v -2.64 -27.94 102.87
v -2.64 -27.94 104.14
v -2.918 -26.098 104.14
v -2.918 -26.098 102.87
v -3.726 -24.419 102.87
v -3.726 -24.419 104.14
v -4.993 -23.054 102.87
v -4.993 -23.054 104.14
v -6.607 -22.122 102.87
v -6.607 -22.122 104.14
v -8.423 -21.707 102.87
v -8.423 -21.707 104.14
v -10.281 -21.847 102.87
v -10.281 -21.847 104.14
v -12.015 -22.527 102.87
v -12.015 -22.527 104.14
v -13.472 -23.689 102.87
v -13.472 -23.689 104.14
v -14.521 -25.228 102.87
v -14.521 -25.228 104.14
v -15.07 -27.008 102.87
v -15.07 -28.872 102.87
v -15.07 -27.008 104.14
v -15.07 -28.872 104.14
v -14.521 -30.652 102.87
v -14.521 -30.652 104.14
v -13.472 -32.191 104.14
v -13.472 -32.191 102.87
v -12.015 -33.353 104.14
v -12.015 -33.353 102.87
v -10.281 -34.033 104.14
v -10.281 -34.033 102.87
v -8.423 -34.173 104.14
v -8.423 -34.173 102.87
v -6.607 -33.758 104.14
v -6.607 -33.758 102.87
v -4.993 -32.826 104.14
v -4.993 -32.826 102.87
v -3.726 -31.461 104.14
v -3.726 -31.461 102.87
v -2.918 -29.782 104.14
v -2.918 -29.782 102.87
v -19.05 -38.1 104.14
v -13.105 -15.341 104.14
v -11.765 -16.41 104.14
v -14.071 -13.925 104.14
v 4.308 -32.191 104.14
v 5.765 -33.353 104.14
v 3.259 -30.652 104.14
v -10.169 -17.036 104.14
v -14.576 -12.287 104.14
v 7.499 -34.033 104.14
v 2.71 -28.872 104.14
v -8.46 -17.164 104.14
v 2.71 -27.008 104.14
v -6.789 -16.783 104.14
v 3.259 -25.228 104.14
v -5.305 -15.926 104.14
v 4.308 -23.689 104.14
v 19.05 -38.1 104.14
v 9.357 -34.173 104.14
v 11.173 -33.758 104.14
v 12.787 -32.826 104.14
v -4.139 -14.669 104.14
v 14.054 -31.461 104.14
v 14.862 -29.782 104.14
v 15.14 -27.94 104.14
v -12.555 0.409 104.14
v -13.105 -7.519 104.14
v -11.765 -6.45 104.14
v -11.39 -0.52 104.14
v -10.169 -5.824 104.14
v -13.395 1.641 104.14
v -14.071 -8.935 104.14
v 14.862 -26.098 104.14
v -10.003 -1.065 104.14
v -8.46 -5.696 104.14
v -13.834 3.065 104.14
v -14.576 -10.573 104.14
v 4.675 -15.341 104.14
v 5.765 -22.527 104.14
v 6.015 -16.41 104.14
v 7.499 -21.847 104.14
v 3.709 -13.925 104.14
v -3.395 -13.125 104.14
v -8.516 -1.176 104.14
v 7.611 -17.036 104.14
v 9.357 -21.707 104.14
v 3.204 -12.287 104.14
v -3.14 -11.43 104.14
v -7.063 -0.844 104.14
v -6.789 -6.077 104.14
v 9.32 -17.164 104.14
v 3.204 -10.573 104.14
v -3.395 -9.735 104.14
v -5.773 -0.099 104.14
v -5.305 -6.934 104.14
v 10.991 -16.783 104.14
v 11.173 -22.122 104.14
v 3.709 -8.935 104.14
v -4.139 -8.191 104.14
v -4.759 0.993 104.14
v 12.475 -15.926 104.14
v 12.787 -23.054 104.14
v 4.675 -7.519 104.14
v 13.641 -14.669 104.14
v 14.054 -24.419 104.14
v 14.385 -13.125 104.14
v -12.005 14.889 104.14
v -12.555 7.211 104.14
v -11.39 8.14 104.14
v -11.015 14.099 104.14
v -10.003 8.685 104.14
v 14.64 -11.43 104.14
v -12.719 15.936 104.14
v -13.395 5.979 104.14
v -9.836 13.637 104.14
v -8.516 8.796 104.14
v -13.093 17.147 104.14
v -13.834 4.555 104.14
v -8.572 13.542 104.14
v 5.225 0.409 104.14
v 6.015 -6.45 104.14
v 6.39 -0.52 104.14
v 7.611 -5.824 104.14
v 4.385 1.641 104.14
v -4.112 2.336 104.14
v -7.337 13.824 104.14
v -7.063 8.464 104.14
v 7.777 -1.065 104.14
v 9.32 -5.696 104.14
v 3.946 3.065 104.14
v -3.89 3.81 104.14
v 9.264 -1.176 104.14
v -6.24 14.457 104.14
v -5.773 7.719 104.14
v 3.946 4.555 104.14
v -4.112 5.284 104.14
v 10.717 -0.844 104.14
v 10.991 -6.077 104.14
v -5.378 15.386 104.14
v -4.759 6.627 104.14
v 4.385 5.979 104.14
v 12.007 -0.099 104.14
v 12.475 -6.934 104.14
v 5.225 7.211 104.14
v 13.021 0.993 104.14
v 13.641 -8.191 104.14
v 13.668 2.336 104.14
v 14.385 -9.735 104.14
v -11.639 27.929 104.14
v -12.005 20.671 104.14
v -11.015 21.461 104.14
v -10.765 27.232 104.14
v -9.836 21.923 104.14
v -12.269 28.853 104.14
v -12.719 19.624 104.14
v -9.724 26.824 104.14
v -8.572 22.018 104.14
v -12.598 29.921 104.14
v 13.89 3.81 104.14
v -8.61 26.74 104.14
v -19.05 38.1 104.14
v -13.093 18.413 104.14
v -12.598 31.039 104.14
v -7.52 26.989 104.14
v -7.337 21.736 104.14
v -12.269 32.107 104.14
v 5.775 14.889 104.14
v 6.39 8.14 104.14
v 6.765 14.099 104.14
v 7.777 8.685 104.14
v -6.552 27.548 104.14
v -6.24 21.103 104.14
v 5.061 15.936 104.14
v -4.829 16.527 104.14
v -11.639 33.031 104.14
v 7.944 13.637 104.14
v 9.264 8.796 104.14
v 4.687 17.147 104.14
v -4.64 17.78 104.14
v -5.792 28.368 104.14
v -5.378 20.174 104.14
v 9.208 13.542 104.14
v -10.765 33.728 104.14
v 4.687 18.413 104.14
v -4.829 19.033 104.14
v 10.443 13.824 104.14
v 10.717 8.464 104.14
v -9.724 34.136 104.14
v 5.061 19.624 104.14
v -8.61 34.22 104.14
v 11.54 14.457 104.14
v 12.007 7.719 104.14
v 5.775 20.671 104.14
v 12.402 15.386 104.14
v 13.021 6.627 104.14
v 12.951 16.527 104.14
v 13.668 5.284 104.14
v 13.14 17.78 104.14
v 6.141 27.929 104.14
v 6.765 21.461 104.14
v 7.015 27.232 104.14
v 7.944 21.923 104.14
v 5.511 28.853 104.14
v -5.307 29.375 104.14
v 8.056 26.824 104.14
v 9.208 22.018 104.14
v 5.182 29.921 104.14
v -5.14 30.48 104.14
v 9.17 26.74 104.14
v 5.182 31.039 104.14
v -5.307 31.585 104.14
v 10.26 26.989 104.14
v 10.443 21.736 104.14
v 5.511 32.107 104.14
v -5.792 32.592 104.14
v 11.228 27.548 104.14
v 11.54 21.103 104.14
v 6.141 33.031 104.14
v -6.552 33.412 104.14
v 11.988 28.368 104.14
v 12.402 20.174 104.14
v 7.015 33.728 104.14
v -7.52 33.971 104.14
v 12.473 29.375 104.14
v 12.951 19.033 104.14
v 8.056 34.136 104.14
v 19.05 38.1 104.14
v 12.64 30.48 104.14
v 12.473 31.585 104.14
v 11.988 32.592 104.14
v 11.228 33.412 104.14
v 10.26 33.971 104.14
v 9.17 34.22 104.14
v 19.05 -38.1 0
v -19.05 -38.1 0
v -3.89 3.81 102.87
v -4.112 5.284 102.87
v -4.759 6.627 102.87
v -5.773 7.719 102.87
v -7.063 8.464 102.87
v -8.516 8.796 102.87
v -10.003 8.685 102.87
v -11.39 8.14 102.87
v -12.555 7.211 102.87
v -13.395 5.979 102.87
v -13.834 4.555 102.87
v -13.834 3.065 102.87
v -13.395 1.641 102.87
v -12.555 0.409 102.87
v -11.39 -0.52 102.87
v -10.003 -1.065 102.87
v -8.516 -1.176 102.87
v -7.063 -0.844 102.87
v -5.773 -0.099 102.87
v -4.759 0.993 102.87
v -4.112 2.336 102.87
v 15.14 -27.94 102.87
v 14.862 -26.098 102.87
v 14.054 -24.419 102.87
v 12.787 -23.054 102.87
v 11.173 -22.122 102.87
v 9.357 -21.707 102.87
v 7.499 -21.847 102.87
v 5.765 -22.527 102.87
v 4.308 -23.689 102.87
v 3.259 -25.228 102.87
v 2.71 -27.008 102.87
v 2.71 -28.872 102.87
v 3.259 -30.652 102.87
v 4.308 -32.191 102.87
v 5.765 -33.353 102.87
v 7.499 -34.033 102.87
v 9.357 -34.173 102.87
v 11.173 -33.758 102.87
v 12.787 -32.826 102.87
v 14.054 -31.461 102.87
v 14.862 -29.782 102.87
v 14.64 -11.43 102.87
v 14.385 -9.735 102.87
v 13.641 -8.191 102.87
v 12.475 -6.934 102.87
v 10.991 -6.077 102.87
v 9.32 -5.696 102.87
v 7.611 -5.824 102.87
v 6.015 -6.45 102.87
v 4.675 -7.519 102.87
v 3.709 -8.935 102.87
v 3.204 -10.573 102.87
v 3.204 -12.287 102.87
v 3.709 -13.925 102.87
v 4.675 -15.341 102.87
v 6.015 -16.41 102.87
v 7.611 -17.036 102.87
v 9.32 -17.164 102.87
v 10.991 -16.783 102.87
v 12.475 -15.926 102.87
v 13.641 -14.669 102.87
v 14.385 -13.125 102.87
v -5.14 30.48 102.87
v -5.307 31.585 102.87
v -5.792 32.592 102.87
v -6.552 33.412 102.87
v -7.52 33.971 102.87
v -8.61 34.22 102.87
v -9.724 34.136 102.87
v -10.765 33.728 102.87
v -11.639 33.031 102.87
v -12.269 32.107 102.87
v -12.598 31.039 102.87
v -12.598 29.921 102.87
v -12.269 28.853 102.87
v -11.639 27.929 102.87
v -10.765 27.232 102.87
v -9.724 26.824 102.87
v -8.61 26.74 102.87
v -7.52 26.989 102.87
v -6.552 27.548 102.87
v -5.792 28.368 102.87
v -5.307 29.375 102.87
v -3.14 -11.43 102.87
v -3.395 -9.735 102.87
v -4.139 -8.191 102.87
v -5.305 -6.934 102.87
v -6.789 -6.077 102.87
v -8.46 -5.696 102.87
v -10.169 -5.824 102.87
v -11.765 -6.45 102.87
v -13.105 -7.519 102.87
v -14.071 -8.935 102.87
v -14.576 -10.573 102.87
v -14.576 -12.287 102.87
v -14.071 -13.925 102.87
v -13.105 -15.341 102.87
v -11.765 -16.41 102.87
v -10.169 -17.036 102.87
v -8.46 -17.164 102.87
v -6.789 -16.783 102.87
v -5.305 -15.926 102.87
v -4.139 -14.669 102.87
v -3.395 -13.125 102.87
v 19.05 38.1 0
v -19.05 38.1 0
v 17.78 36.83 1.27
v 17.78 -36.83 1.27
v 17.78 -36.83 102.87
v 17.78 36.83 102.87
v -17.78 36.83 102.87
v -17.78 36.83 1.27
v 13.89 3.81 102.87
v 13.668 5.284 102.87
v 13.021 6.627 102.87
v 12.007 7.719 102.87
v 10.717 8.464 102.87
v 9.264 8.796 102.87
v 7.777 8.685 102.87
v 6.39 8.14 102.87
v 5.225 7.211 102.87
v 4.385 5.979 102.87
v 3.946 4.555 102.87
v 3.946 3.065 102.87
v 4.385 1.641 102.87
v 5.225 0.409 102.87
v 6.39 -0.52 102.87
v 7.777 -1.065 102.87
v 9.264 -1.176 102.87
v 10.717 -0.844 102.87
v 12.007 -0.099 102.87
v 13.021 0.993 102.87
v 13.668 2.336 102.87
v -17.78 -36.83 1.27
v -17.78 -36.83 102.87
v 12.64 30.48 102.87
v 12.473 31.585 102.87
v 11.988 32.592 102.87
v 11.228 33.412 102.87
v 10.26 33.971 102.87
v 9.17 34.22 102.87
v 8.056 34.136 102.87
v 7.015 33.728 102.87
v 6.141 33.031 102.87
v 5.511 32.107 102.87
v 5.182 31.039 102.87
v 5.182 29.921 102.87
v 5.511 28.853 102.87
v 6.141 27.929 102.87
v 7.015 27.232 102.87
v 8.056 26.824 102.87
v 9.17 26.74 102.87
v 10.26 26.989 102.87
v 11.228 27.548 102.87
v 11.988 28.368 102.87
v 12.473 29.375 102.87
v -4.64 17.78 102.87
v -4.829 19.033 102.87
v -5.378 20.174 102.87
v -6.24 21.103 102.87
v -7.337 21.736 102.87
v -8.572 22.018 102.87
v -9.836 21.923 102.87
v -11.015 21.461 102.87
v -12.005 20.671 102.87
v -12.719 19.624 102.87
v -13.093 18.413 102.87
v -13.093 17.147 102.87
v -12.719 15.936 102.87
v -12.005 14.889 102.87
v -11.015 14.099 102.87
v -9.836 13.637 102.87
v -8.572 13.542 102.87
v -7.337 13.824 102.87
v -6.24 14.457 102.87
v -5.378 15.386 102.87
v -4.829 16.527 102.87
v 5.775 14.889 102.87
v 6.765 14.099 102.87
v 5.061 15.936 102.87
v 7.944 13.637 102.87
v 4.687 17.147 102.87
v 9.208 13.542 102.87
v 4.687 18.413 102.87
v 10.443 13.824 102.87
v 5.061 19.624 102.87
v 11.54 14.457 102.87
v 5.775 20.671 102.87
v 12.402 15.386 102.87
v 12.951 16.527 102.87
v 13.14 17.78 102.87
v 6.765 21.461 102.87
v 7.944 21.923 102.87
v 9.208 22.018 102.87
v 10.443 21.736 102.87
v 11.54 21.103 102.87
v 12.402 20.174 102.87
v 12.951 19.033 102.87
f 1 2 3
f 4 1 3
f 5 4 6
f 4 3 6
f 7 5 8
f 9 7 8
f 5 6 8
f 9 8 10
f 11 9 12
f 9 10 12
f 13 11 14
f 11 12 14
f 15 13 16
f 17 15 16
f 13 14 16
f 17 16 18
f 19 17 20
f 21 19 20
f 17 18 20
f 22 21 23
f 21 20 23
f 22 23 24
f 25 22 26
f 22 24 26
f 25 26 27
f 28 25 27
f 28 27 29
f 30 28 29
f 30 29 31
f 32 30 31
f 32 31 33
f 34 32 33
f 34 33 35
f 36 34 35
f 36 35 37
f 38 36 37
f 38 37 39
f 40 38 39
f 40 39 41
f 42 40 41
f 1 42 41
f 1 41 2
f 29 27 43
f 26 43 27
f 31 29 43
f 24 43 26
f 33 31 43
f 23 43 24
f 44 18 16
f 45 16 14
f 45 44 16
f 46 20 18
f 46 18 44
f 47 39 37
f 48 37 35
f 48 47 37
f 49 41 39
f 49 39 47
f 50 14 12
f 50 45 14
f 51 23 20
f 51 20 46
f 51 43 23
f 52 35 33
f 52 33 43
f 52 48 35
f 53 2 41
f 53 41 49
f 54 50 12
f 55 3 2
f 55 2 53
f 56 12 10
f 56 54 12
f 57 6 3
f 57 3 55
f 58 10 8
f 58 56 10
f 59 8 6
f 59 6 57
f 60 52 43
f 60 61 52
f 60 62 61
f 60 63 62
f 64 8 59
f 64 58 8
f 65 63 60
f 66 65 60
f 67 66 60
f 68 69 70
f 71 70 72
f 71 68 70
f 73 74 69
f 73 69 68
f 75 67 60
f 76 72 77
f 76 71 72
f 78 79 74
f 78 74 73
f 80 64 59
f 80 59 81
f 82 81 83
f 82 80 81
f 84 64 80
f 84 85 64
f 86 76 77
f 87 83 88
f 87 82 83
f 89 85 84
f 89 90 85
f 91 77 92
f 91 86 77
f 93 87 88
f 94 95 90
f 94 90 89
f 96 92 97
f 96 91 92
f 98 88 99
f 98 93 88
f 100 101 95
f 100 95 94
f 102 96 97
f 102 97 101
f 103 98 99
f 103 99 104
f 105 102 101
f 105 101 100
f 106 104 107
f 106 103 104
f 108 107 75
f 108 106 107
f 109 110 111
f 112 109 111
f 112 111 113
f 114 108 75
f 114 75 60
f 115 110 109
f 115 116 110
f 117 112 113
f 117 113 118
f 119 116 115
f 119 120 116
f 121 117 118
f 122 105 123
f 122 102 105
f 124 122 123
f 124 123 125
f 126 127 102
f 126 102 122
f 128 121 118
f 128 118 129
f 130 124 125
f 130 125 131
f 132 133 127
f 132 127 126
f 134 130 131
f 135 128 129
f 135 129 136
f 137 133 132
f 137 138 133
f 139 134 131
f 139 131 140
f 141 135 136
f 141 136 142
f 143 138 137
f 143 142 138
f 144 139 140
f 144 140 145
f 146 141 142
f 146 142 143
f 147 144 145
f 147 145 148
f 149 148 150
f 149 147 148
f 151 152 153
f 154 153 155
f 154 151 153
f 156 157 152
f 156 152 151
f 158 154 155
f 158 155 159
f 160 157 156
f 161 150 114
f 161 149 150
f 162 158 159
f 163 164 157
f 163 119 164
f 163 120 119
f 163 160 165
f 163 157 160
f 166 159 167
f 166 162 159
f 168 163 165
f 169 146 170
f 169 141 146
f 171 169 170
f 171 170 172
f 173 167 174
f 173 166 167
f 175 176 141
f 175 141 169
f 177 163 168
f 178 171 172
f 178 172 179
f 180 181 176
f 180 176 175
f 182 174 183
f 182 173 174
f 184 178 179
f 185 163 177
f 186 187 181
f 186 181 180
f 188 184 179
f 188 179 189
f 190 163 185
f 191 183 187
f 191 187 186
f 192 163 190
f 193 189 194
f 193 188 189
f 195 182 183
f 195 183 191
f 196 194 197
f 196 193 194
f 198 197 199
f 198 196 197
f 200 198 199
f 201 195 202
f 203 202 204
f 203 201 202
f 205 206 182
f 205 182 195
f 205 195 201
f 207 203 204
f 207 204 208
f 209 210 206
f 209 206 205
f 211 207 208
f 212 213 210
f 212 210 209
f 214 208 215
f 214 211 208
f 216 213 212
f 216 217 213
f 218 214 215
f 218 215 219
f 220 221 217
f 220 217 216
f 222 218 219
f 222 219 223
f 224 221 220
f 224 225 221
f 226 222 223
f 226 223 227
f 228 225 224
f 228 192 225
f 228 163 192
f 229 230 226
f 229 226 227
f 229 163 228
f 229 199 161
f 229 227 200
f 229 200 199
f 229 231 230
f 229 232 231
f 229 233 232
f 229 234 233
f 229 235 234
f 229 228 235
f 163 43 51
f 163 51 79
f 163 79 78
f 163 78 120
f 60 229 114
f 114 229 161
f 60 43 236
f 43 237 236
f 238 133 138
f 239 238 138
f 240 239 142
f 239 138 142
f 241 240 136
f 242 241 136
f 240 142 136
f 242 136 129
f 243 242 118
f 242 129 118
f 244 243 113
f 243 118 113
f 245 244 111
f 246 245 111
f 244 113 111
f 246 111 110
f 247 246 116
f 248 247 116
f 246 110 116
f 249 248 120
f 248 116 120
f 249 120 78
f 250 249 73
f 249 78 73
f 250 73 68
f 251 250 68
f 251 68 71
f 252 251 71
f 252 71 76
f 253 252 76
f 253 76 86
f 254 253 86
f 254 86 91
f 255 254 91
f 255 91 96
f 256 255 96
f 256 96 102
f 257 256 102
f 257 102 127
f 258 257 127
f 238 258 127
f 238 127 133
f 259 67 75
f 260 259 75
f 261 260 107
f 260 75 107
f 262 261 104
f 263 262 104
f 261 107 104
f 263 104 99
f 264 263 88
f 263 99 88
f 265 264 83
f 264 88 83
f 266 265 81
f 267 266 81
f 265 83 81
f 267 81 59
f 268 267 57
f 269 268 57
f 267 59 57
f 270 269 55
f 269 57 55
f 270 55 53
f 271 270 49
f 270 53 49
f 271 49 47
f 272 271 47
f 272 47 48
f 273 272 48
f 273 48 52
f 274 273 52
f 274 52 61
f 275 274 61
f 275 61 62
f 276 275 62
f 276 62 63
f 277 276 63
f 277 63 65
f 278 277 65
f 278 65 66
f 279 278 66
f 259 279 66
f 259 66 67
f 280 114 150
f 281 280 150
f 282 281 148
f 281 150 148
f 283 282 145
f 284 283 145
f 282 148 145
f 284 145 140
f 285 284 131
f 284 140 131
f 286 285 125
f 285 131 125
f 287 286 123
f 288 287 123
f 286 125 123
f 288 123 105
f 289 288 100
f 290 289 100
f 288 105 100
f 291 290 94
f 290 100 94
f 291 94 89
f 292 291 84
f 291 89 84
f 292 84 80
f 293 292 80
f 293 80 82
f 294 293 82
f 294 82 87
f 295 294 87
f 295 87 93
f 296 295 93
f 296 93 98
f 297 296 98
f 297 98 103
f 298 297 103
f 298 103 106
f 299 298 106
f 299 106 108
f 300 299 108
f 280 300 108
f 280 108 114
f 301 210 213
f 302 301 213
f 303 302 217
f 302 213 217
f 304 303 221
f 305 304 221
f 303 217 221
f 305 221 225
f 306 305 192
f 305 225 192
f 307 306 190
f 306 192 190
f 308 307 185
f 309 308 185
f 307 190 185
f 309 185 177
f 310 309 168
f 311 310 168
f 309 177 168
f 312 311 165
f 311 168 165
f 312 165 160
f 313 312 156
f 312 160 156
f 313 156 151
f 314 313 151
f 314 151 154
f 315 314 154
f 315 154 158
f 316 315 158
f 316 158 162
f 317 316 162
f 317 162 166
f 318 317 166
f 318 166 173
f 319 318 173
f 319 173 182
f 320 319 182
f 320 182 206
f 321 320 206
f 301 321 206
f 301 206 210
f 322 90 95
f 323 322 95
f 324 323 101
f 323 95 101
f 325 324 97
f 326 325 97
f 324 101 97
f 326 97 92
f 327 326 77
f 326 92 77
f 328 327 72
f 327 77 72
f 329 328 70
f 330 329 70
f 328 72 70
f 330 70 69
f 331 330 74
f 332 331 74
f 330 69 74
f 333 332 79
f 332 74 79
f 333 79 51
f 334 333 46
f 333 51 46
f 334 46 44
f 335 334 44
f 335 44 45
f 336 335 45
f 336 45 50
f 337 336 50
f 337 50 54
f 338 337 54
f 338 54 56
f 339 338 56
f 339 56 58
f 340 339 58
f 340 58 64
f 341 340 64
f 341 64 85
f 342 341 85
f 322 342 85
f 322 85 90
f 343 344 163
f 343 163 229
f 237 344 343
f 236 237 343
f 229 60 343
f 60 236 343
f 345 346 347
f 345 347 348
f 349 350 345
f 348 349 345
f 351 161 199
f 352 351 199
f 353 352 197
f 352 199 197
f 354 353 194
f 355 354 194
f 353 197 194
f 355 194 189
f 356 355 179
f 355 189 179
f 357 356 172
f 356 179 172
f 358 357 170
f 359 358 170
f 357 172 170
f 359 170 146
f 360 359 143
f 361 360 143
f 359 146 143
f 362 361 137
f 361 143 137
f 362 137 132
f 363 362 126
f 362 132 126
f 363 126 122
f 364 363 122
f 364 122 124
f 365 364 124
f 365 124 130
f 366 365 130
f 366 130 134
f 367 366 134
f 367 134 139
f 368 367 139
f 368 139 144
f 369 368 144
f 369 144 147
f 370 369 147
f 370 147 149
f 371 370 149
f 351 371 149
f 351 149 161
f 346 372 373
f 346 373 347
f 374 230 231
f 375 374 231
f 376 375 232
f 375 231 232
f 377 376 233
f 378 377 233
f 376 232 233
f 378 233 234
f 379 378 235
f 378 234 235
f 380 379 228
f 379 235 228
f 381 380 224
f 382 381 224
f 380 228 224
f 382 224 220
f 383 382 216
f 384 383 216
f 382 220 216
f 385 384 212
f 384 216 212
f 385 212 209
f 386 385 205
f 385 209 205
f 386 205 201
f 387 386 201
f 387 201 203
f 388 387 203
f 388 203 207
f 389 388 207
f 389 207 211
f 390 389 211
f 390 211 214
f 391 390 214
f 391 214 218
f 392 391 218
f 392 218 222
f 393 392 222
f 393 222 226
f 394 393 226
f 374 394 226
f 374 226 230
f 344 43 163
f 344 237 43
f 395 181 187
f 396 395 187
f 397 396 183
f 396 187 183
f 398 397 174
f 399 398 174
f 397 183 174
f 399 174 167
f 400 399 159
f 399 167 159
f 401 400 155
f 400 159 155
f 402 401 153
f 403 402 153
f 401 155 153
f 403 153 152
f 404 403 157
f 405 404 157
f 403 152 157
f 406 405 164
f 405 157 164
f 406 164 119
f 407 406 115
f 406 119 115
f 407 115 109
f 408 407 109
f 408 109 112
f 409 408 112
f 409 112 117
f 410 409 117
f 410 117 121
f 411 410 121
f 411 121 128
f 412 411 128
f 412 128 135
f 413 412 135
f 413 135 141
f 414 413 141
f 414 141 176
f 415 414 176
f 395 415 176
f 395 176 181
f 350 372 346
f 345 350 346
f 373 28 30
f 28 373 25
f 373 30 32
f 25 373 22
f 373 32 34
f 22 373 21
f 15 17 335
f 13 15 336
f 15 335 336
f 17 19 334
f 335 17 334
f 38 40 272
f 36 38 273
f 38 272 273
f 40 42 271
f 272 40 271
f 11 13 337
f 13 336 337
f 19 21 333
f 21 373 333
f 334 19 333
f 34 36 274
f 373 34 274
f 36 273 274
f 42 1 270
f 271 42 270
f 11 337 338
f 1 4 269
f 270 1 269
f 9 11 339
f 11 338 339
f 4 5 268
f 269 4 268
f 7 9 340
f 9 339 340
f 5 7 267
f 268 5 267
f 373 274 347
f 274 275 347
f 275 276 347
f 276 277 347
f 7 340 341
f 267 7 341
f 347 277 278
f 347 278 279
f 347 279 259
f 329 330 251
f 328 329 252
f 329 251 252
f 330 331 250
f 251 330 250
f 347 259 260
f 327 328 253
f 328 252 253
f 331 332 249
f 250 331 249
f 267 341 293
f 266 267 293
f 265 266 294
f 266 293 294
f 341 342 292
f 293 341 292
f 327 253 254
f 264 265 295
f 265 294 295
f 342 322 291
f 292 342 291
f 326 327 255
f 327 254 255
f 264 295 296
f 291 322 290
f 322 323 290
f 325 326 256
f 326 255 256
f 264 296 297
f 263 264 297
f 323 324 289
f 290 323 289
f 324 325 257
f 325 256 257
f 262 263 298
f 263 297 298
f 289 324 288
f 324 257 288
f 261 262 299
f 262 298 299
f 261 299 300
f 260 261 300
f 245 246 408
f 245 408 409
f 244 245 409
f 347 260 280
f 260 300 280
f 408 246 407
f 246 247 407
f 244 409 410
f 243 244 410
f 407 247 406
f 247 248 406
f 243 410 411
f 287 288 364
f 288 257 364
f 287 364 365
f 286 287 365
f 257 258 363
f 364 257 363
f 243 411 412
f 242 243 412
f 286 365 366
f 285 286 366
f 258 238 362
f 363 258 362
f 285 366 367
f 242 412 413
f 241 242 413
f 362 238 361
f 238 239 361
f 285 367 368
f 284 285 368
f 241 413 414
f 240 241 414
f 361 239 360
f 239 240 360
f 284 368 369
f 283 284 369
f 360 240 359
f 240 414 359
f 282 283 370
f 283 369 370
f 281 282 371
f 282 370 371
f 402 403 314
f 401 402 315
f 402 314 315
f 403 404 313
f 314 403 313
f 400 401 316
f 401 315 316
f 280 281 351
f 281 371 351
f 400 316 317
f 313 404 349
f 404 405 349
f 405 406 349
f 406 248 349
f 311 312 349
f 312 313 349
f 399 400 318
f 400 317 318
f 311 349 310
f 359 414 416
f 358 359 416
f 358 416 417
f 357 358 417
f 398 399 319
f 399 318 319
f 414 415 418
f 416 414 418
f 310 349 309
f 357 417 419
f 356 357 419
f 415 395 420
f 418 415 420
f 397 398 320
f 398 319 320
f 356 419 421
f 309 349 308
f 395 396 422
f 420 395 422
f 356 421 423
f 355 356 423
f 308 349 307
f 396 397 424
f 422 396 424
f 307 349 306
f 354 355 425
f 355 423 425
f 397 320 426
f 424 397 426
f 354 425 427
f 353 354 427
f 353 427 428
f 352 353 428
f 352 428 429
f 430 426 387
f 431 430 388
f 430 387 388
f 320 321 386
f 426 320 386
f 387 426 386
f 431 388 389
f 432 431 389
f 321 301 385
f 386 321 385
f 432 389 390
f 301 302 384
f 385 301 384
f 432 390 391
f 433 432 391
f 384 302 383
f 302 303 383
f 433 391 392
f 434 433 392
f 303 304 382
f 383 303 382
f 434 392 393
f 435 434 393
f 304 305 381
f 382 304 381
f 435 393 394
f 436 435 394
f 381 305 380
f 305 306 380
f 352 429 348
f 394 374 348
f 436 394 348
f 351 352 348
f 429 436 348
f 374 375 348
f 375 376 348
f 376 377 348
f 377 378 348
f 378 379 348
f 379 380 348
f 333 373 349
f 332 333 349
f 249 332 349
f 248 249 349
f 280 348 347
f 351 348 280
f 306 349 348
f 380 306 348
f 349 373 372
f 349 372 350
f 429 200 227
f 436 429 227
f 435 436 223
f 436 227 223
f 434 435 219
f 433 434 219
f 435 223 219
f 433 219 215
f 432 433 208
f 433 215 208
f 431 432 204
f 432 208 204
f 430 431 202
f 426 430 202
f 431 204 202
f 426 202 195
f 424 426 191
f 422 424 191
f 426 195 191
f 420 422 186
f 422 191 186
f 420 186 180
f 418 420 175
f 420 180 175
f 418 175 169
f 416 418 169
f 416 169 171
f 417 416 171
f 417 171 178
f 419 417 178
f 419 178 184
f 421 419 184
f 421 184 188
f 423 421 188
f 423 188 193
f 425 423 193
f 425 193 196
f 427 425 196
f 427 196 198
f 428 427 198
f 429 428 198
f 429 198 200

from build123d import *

# Parameters (mm, degrees)
F0_W     = 38.1
F0_H     = 76.2
F1_DEPTH = 1.27
F2_W     = 1.27
F2_H     = 1.27
F2_W_2   = 35.56
F2_H_2   = 73.66
F3_DEPTH = 101.6
F4_W     = 38.1
F4_H     = 76.2
F5_DEPTH = 1.27
F7_R     = 3.75
F7_R_2   = 4.25
F7_R_3   = 5
F7_R_4   = 5.75
F7_R_5   = 6.25
F8_DEPTH = 25.4


with BuildPart() as f1:
    # F0 (on Top) → F1 (new body)
    with BuildSketch(Plane.XY):
        Rectangle(F0_W, F0_H)
    extrude(amount=F1_DEPTH)

    # F2 (on face) → F3 (join)
    with BuildSketch(Plane.XY.offset(1.27)):
        with Locations((-18.415, 37.465)):
            Rectangle(F2_W, F2_H)
        with Locations((0, 37.465)):
            Rectangle(F2_W_2, F2_H)
        with Locations((-18.415, 0)):
            Rectangle(F2_W, F2_H_2)
        with Locations((18.415, 37.465)):
            Rectangle(F2_W, F2_H)
        with Locations((-18.415, -37.465)):
            Rectangle(F2_W, F2_H)
        with Locations((0, -37.465)):
            Rectangle(F2_W_2, F2_H)
        with Locations((18.415, 0)):
            Rectangle(F2_W, F2_H_2)
        with Locations((18.415, -37.465)):
            Rectangle(F2_W, F2_H)
    extrude(amount=F3_DEPTH)

    # F4 (on face) → F5 (join)
    with BuildSketch(Plane.XY.offset(102.87)):
        Rectangle(F4_W, F4_H)
    extrude(amount=F5_DEPTH)

    # F7 (on face) → F8 (cut)
    with BuildSketch(Plane.XY.offset(104.14)):
        with Locations((-8.89, 30.48)):
            Circle(F7_R)
        with Locations((8.89, 30.48)):
            Circle(F7_R)
        with Locations((-8.89, 17.78)):
            Circle(F7_R_2)
        with Locations((8.89, 17.78)):
            Circle(F7_R_2)
        with Locations((8.89, 3.81)):
            Circle(F7_R_3)
        with Locations((-8.89, 3.81)):
            Circle(F7_R_3)
        with Locations((-8.89, -11.43)):
            Circle(F7_R_4)
        with Locations((8.89, -11.43)):
            Circle(F7_R_4)
        with Locations((8.89, -27.94)):
            Circle(F7_R_5)
        with Locations((-8.89, -27.94)):
            Circle(F7_R_5)
    extrude(amount=-F8_DEPTH, mode=Mode.SUBTRACT)


solid = f1.part
